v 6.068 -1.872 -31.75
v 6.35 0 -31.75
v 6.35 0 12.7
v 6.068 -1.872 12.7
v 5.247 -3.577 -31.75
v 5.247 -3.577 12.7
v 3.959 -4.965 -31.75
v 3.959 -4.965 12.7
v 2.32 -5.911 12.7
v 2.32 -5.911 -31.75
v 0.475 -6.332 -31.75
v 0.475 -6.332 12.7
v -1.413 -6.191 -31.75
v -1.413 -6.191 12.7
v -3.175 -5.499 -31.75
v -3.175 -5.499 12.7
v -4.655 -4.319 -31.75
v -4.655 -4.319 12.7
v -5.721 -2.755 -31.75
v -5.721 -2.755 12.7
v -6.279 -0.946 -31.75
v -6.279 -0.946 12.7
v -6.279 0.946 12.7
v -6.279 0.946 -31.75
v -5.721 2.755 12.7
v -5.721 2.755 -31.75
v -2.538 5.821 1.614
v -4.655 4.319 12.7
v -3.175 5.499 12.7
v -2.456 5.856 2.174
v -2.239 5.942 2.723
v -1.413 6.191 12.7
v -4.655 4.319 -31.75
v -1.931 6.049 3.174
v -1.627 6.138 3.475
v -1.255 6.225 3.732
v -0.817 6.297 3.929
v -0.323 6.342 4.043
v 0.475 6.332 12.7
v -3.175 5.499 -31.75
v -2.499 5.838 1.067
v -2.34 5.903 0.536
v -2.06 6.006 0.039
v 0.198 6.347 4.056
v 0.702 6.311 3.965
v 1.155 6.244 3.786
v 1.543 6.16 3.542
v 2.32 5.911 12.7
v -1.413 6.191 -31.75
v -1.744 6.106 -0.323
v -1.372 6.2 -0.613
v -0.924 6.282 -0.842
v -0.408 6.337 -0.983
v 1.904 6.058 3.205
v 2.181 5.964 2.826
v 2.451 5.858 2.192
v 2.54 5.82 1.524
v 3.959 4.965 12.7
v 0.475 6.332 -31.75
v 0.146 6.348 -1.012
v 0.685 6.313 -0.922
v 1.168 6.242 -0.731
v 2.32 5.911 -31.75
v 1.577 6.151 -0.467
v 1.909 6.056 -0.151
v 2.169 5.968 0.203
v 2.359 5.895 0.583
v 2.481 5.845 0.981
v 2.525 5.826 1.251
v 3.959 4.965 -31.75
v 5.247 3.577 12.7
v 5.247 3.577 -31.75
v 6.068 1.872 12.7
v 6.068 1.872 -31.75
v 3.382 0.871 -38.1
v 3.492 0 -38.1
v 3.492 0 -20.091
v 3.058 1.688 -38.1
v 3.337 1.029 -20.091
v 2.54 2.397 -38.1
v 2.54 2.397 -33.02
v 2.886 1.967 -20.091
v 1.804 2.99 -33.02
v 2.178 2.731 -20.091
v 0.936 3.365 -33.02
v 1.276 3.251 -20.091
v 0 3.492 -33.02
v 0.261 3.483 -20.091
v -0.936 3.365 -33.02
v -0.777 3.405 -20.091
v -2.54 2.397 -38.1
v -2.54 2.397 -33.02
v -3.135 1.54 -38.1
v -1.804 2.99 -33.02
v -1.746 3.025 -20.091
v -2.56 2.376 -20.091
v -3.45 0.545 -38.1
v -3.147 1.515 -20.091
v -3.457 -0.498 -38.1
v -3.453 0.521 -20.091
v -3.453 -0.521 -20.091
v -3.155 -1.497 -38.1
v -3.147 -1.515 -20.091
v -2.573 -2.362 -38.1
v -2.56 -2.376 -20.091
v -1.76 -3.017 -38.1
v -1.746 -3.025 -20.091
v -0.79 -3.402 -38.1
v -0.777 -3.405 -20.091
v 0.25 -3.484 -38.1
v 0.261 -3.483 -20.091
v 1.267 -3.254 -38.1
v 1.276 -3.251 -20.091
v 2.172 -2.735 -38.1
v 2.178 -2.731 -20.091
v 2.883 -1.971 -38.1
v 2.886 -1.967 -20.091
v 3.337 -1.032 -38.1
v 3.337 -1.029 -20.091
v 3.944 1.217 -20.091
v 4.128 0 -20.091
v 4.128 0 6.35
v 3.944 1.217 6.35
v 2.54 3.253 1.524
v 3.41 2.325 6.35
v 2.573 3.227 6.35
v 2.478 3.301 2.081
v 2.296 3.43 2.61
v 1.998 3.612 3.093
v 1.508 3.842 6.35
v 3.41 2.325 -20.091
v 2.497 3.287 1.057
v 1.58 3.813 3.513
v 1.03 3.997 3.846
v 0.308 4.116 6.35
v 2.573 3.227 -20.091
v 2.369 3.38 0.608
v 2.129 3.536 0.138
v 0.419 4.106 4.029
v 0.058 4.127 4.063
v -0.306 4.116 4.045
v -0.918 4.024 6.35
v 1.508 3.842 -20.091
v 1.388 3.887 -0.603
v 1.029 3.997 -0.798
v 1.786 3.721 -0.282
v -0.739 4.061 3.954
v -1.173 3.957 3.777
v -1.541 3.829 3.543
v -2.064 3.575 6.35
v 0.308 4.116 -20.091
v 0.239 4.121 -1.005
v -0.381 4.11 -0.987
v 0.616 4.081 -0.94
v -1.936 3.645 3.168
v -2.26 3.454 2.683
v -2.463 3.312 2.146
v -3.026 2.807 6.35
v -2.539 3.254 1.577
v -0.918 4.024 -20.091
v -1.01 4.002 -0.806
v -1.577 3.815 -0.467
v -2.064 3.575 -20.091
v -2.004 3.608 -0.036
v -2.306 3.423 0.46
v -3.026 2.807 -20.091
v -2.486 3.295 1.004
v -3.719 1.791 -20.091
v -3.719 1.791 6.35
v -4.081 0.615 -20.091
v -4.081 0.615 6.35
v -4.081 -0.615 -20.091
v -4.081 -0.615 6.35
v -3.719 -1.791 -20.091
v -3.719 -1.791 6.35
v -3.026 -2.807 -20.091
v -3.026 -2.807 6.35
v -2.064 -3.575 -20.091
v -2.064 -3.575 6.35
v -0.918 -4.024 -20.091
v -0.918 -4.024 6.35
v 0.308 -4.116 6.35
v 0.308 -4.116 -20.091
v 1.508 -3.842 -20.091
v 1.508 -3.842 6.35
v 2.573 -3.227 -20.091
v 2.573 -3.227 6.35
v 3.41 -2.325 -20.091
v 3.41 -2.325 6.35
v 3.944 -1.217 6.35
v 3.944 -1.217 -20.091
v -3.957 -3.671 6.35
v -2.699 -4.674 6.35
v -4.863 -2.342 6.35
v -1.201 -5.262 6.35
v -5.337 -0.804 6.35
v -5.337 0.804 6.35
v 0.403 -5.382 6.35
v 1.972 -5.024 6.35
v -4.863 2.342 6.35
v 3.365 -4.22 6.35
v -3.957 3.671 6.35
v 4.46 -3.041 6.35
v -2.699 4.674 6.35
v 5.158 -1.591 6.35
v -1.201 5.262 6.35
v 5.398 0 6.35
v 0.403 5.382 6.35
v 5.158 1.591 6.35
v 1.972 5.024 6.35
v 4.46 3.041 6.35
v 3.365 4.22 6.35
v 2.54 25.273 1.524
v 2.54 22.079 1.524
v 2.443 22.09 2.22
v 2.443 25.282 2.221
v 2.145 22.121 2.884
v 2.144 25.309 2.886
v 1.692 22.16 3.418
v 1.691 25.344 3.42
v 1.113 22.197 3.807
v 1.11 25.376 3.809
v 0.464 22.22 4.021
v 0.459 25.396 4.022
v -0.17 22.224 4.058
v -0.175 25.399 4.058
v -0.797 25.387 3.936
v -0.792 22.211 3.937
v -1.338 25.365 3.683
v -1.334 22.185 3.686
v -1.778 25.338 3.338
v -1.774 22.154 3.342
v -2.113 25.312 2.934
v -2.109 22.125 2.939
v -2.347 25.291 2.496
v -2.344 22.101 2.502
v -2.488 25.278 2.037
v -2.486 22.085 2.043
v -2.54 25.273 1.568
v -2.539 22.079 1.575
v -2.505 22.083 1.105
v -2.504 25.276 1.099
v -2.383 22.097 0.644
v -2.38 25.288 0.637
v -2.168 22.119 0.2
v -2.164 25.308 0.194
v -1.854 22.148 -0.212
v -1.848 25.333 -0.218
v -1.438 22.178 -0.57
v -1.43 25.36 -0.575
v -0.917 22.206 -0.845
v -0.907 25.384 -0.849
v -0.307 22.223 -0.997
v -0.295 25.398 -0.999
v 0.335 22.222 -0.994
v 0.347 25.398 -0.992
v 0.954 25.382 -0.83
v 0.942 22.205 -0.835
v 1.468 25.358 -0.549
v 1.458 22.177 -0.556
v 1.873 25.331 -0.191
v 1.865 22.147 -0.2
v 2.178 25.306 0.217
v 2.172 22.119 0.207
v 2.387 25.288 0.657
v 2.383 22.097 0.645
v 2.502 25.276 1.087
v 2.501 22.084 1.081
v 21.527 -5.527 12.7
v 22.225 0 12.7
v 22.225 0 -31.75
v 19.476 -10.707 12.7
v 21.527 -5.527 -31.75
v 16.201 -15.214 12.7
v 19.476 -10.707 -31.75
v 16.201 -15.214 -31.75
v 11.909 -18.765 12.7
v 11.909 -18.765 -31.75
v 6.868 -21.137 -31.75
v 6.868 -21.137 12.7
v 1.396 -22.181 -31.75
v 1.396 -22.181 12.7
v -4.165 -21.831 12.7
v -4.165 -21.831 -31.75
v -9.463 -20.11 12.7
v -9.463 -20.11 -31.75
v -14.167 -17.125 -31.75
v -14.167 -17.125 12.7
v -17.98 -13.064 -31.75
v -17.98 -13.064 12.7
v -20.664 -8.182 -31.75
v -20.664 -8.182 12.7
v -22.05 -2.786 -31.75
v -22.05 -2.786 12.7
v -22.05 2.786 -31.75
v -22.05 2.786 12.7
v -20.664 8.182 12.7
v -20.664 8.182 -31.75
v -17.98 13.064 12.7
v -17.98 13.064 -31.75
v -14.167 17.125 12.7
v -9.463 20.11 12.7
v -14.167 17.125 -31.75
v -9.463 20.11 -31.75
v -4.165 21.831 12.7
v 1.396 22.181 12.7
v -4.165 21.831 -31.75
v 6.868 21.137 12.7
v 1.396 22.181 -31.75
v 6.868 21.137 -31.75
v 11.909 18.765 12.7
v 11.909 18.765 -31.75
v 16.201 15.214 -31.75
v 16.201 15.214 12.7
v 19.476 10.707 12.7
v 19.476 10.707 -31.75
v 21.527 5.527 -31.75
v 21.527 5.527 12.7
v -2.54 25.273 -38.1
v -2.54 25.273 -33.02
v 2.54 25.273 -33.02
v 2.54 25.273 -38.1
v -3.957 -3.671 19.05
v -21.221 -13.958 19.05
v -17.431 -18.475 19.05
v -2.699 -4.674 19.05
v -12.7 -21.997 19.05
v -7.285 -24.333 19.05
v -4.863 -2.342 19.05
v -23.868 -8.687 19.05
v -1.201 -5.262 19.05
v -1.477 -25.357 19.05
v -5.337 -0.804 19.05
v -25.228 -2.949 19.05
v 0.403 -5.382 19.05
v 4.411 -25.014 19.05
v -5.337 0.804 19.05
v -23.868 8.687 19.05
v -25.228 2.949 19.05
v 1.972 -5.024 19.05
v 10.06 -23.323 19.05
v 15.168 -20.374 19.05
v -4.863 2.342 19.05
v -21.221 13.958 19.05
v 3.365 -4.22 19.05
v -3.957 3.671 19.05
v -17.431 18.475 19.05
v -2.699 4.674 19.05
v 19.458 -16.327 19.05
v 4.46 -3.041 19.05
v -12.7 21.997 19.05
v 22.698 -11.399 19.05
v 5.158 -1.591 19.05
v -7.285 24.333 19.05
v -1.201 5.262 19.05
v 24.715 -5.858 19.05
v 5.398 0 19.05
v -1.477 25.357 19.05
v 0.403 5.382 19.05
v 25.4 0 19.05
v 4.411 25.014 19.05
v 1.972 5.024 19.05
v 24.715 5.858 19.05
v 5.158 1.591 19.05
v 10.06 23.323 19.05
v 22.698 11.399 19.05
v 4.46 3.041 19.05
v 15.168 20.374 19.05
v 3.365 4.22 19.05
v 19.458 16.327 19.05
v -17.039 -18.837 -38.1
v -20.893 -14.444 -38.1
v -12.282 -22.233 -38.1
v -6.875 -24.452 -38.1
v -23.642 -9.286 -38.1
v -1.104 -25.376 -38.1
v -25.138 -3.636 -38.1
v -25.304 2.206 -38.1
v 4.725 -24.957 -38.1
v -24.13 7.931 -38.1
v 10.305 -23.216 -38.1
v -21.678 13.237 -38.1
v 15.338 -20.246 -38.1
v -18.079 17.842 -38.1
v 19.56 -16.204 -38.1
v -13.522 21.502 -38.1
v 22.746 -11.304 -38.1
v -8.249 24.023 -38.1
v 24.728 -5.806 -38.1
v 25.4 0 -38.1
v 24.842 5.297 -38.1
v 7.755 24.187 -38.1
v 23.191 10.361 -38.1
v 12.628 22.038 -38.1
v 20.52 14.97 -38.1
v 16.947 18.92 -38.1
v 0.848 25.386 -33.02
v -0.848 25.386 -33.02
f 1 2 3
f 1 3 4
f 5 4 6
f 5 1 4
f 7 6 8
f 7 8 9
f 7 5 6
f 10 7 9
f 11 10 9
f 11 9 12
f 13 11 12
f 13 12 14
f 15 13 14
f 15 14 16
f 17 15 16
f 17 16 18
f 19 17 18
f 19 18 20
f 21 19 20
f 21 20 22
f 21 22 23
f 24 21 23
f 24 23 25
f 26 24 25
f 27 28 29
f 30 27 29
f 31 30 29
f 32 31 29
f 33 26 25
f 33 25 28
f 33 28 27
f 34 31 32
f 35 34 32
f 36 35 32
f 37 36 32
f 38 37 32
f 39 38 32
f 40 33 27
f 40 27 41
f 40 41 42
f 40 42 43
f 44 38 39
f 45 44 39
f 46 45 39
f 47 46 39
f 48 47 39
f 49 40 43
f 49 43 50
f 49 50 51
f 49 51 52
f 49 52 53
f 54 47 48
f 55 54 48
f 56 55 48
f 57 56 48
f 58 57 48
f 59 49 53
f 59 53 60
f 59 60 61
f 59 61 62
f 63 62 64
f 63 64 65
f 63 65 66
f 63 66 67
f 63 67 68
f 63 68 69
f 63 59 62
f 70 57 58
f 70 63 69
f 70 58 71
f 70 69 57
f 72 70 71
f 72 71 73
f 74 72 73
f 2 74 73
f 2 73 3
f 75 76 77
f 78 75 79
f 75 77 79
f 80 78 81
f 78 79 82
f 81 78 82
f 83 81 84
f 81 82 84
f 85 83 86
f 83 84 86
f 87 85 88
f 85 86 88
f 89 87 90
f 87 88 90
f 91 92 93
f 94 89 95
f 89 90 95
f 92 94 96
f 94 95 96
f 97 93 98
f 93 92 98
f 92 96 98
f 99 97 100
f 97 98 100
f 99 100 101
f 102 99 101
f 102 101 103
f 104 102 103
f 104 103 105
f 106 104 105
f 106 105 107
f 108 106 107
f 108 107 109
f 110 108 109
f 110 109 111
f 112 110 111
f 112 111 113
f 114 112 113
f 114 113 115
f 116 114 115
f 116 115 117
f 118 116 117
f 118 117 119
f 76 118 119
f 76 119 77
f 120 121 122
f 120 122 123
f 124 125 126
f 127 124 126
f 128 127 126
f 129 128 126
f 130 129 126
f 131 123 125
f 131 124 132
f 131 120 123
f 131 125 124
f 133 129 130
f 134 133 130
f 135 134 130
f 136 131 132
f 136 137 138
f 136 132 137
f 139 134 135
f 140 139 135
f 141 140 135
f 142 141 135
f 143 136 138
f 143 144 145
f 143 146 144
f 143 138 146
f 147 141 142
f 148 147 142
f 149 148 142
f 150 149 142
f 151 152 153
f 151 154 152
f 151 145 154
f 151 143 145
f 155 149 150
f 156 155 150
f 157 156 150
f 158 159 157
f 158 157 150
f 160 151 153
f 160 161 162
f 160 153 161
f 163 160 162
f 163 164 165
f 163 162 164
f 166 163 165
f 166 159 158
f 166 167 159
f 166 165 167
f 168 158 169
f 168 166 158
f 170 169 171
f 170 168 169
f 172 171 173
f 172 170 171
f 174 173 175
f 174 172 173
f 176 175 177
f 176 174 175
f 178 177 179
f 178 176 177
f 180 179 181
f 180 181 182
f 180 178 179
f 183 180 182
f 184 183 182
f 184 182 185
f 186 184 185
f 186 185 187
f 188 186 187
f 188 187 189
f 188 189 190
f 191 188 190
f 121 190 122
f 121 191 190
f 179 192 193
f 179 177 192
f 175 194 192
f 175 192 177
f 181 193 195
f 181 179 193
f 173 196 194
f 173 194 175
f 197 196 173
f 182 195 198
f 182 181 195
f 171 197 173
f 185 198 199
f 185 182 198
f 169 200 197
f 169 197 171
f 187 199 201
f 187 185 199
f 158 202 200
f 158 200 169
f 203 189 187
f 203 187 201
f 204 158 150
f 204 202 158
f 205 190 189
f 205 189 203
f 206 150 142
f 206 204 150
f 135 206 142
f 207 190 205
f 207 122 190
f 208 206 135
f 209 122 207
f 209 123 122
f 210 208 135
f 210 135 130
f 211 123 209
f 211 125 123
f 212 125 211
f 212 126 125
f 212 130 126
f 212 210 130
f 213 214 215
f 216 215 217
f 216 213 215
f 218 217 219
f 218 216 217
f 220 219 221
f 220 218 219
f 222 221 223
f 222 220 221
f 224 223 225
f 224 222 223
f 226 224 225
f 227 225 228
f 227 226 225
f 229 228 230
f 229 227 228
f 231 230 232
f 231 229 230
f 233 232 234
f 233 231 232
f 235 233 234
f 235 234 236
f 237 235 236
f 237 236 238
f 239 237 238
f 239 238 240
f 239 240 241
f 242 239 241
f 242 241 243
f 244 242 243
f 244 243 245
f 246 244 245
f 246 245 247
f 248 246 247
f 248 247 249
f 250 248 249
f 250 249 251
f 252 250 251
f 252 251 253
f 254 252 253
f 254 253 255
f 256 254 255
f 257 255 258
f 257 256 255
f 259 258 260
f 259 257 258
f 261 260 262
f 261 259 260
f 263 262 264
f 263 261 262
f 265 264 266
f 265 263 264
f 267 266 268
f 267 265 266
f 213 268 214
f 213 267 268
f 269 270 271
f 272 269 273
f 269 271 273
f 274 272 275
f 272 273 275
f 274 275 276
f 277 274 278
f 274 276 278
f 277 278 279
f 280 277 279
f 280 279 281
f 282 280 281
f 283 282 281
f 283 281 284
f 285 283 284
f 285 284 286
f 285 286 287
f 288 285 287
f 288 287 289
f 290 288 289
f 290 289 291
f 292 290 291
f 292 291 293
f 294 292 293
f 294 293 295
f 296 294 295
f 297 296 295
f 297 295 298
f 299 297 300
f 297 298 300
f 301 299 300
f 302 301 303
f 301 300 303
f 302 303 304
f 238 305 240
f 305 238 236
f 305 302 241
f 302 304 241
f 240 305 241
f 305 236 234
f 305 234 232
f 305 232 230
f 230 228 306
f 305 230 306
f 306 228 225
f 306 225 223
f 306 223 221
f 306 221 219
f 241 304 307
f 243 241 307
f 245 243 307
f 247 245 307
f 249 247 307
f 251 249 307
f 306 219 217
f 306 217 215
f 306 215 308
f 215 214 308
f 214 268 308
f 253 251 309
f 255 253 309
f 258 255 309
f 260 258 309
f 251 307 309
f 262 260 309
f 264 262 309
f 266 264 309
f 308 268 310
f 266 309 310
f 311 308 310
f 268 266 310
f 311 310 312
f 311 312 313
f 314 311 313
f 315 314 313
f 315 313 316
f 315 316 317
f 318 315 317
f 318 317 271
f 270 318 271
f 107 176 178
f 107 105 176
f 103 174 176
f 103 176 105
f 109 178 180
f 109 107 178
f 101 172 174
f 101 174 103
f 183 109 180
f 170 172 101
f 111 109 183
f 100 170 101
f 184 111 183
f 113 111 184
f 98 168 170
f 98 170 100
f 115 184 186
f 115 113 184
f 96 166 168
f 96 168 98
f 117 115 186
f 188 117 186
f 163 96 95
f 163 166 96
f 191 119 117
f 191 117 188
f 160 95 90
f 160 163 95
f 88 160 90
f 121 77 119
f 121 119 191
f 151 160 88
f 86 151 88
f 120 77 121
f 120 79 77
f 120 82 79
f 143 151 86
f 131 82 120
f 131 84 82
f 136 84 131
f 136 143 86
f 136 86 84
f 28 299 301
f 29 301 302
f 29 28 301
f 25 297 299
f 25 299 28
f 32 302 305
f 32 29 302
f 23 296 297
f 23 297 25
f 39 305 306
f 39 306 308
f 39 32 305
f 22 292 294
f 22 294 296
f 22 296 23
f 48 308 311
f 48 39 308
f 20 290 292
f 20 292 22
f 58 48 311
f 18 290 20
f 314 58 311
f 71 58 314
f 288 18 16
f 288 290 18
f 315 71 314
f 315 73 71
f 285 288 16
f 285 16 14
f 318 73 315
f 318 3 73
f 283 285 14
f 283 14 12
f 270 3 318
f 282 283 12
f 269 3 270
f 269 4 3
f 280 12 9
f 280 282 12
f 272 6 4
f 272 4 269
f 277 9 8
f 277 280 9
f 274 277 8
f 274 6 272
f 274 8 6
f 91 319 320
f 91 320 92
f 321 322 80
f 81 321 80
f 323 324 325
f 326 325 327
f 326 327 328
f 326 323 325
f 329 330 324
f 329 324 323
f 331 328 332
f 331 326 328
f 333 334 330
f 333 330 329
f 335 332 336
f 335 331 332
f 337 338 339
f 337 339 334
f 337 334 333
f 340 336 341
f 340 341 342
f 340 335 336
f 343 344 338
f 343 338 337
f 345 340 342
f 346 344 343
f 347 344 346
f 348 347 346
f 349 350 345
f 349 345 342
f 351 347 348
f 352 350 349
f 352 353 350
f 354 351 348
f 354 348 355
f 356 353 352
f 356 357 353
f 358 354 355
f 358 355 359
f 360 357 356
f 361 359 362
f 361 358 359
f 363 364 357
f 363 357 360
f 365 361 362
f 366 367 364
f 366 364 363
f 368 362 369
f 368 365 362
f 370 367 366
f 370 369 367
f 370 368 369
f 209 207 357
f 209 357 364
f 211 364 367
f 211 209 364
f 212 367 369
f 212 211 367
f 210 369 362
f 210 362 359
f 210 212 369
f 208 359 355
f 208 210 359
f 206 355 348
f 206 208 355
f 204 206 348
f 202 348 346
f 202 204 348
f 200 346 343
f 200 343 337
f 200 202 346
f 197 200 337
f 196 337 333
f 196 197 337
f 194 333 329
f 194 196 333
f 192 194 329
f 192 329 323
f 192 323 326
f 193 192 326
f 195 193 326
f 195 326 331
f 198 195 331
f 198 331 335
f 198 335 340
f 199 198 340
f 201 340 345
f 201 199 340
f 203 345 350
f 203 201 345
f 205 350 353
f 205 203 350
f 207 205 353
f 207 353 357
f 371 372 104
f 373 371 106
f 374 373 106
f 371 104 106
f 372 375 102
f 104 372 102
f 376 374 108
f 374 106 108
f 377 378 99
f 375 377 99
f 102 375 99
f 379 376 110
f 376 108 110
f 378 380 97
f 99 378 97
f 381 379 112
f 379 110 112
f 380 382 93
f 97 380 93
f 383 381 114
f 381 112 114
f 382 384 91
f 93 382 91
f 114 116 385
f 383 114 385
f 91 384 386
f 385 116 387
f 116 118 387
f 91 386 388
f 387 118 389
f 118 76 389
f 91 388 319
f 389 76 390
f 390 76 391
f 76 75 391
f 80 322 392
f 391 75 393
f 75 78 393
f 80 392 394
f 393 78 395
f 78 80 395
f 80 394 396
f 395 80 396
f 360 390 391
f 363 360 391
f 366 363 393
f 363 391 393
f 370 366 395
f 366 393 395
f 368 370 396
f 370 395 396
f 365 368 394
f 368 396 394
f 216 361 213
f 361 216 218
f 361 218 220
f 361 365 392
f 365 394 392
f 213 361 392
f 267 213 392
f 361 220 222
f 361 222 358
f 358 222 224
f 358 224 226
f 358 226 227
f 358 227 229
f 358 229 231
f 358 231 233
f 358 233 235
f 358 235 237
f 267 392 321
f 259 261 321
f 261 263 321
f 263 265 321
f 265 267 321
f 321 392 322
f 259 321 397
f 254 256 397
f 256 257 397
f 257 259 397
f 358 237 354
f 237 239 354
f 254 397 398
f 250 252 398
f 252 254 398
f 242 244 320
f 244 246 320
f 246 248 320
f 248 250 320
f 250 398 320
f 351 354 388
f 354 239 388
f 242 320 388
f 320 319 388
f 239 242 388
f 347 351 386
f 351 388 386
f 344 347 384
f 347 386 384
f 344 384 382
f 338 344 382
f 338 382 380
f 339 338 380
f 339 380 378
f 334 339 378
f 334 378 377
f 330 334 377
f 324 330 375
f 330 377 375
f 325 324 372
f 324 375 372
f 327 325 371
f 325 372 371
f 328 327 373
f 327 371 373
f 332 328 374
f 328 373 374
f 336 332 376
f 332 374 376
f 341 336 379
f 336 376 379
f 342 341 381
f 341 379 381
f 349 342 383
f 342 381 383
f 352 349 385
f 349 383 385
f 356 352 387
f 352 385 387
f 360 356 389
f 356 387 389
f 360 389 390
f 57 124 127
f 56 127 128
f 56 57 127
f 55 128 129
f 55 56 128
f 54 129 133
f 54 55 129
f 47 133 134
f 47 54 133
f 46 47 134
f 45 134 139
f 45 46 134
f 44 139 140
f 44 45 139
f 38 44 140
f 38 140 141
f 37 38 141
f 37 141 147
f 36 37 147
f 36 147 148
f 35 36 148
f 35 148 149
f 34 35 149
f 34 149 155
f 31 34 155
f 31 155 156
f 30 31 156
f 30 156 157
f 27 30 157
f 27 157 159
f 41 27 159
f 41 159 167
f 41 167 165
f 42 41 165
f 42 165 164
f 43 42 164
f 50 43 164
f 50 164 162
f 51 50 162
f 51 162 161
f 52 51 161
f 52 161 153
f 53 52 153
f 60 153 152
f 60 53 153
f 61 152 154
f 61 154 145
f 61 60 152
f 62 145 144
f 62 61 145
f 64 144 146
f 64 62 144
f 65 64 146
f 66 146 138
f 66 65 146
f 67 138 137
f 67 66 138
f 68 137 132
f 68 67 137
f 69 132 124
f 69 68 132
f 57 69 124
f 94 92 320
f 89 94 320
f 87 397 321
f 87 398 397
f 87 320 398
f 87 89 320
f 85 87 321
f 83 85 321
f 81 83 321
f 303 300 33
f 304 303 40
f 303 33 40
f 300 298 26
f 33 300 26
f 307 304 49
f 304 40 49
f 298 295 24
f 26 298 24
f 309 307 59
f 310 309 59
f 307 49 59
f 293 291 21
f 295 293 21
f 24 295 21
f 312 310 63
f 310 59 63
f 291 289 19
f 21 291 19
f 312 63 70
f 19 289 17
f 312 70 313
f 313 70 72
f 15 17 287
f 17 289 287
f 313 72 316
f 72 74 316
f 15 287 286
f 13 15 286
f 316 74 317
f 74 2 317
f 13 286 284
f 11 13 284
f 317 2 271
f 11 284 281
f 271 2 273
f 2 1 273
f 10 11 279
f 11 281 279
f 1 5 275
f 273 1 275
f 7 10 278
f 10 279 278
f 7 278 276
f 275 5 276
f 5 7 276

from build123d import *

# Parameters (mm, degrees)
F0_R      = 25.4
F1_DEPTH  = 38.1
F3_R      = 4.1275
F4_DEPTH  = 20.0914
F5_R      = 3.4925
F6_DEPTH  = 18.0096
F7_W      = 5.08
F7_H      = 26.67
F8_DEPTH  = 5.08
F9_R      = 25.4
F9_R_2    = 4.1275
F10_DEPTH = 6.35
F11_R     = 25.4
F11_R_2   = 5.3975
F12_DEPTH = 12.7
F13_R     = 2.54
F14_DEPTH = 25.4
F16_R     = 22.225
F16_R_2   = 6.35
F17_DEPTH = 44.45


with BuildPart() as f1:
    # F0 (on Top) → F1 (new body)
    with BuildSketch(Plane.XY):
        Circle(F0_R)
    extrude(amount=-F1_DEPTH)

    # F3 (on face) → F4 (cut)
    with BuildSketch(Plane.XY):
        Circle(F3_R)
    extrude(amount=-F4_DEPTH, mode=Mode.SUBTRACT)

    # F5 (on face) → F6 (cut, through all)
    with BuildSketch(Plane.XY.offset(-20.0914)):
        Circle(F5_R)
    extrude(amount=-F6_DEPTH, mode=Mode.SUBTRACT)

    # F7 (on face) → F8 (cut)
    with BuildSketch(Plane(origin=(0, 0, -38.1), x_dir=(1, 0, 0), z_dir=(0, 0, -1))):
        with Locations((0, -13.335)):
            Rectangle(F7_W, F7_H)
    extrude(amount=-F8_DEPTH, mode=Mode.SUBTRACT)

    # F9 (on face) → F10 (join)
    with BuildSketch(Plane.XY):
        Circle(F9_R)
        Circle(F9_R_2, mode=Mode.SUBTRACT)
    extrude(amount=F10_DEPTH)

    # F11 (on face) → F12 (join)
    with BuildSketch(Plane.XY.offset(6.35)):
        Circle(F11_R)
        Circle(F11_R_2, mode=Mode.SUBTRACT)
    extrude(amount=F12_DEPTH)

    # F13 (on offset) → F14 (cut, through all)
    with BuildSketch(Plane.XZ.offset(-25.4)):
        with Locations((0, 1.524)):
            Circle(F13_R)
    extrude(amount=F14_DEPTH, mode=Mode.SUBTRACT)

    # F16 (on offset) → F17 (cut)
    with BuildSketch(Plane(origin=(0, 0, -31.75), x_dir=(1, 0, 0), z_dir=(0, 0, -1))):
        Circle(F16_R)
        Circle(F16_R_2, mode=Mode.SUBTRACT)
    extrude(amount=-F17_DEPTH, mode=Mode.SUBTRACT)


solid = f1.part
